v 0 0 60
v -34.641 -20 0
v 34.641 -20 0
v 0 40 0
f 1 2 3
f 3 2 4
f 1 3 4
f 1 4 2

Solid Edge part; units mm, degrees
sketch "Sketch1" plane through (0, 0, 0) normal (0, 0, 1) x (1, 0, 0)
  line L0 (-34.641, -20) -> (34.641, -20)
  line L1 (34.641, -20) -> (0, 40)
  line L2 (0, 40) -> (-34.641, -20)
extrude "Protrusion1" add sketch "Sketch1" along normal up to vertex (60 mm away)
sketch "Sketch2" plane through (0, 0, 0) normal (1, 0, 0) x (0, 1, 0)
  line L0 (-20, 60) -> (-20, 0)
  line L1 (-20, 0) -> (0, 60)
  line L2 (0, 60) -> (-20, 60)
extrude "Cutout1" cut sketch "Sketch2" along normal mid plane 69.282
pattern_circular "Pattern1" count 3 over 360 about axis through (0, 0, 60) along (0, 0, 1) of "Protrusion1"
sketch "Sketch3" plane through (0, 0, 0) normal (1, 0, 0) x (0, 1, 0)
  line L0 (-20, 60) -> (-20, 0)
  line L1 (-20, 0) -> (0, 60)
  line L2 (0, 60) -> (-20, 60)
extrude "Cutout2" cut sketch "Sketch3" along normal mid plane 69.282
pattern_circular "Pattern2" count 3 over 360 about axis through (0, 0, 60) along (0, 0, 1) of "Cutout2"
